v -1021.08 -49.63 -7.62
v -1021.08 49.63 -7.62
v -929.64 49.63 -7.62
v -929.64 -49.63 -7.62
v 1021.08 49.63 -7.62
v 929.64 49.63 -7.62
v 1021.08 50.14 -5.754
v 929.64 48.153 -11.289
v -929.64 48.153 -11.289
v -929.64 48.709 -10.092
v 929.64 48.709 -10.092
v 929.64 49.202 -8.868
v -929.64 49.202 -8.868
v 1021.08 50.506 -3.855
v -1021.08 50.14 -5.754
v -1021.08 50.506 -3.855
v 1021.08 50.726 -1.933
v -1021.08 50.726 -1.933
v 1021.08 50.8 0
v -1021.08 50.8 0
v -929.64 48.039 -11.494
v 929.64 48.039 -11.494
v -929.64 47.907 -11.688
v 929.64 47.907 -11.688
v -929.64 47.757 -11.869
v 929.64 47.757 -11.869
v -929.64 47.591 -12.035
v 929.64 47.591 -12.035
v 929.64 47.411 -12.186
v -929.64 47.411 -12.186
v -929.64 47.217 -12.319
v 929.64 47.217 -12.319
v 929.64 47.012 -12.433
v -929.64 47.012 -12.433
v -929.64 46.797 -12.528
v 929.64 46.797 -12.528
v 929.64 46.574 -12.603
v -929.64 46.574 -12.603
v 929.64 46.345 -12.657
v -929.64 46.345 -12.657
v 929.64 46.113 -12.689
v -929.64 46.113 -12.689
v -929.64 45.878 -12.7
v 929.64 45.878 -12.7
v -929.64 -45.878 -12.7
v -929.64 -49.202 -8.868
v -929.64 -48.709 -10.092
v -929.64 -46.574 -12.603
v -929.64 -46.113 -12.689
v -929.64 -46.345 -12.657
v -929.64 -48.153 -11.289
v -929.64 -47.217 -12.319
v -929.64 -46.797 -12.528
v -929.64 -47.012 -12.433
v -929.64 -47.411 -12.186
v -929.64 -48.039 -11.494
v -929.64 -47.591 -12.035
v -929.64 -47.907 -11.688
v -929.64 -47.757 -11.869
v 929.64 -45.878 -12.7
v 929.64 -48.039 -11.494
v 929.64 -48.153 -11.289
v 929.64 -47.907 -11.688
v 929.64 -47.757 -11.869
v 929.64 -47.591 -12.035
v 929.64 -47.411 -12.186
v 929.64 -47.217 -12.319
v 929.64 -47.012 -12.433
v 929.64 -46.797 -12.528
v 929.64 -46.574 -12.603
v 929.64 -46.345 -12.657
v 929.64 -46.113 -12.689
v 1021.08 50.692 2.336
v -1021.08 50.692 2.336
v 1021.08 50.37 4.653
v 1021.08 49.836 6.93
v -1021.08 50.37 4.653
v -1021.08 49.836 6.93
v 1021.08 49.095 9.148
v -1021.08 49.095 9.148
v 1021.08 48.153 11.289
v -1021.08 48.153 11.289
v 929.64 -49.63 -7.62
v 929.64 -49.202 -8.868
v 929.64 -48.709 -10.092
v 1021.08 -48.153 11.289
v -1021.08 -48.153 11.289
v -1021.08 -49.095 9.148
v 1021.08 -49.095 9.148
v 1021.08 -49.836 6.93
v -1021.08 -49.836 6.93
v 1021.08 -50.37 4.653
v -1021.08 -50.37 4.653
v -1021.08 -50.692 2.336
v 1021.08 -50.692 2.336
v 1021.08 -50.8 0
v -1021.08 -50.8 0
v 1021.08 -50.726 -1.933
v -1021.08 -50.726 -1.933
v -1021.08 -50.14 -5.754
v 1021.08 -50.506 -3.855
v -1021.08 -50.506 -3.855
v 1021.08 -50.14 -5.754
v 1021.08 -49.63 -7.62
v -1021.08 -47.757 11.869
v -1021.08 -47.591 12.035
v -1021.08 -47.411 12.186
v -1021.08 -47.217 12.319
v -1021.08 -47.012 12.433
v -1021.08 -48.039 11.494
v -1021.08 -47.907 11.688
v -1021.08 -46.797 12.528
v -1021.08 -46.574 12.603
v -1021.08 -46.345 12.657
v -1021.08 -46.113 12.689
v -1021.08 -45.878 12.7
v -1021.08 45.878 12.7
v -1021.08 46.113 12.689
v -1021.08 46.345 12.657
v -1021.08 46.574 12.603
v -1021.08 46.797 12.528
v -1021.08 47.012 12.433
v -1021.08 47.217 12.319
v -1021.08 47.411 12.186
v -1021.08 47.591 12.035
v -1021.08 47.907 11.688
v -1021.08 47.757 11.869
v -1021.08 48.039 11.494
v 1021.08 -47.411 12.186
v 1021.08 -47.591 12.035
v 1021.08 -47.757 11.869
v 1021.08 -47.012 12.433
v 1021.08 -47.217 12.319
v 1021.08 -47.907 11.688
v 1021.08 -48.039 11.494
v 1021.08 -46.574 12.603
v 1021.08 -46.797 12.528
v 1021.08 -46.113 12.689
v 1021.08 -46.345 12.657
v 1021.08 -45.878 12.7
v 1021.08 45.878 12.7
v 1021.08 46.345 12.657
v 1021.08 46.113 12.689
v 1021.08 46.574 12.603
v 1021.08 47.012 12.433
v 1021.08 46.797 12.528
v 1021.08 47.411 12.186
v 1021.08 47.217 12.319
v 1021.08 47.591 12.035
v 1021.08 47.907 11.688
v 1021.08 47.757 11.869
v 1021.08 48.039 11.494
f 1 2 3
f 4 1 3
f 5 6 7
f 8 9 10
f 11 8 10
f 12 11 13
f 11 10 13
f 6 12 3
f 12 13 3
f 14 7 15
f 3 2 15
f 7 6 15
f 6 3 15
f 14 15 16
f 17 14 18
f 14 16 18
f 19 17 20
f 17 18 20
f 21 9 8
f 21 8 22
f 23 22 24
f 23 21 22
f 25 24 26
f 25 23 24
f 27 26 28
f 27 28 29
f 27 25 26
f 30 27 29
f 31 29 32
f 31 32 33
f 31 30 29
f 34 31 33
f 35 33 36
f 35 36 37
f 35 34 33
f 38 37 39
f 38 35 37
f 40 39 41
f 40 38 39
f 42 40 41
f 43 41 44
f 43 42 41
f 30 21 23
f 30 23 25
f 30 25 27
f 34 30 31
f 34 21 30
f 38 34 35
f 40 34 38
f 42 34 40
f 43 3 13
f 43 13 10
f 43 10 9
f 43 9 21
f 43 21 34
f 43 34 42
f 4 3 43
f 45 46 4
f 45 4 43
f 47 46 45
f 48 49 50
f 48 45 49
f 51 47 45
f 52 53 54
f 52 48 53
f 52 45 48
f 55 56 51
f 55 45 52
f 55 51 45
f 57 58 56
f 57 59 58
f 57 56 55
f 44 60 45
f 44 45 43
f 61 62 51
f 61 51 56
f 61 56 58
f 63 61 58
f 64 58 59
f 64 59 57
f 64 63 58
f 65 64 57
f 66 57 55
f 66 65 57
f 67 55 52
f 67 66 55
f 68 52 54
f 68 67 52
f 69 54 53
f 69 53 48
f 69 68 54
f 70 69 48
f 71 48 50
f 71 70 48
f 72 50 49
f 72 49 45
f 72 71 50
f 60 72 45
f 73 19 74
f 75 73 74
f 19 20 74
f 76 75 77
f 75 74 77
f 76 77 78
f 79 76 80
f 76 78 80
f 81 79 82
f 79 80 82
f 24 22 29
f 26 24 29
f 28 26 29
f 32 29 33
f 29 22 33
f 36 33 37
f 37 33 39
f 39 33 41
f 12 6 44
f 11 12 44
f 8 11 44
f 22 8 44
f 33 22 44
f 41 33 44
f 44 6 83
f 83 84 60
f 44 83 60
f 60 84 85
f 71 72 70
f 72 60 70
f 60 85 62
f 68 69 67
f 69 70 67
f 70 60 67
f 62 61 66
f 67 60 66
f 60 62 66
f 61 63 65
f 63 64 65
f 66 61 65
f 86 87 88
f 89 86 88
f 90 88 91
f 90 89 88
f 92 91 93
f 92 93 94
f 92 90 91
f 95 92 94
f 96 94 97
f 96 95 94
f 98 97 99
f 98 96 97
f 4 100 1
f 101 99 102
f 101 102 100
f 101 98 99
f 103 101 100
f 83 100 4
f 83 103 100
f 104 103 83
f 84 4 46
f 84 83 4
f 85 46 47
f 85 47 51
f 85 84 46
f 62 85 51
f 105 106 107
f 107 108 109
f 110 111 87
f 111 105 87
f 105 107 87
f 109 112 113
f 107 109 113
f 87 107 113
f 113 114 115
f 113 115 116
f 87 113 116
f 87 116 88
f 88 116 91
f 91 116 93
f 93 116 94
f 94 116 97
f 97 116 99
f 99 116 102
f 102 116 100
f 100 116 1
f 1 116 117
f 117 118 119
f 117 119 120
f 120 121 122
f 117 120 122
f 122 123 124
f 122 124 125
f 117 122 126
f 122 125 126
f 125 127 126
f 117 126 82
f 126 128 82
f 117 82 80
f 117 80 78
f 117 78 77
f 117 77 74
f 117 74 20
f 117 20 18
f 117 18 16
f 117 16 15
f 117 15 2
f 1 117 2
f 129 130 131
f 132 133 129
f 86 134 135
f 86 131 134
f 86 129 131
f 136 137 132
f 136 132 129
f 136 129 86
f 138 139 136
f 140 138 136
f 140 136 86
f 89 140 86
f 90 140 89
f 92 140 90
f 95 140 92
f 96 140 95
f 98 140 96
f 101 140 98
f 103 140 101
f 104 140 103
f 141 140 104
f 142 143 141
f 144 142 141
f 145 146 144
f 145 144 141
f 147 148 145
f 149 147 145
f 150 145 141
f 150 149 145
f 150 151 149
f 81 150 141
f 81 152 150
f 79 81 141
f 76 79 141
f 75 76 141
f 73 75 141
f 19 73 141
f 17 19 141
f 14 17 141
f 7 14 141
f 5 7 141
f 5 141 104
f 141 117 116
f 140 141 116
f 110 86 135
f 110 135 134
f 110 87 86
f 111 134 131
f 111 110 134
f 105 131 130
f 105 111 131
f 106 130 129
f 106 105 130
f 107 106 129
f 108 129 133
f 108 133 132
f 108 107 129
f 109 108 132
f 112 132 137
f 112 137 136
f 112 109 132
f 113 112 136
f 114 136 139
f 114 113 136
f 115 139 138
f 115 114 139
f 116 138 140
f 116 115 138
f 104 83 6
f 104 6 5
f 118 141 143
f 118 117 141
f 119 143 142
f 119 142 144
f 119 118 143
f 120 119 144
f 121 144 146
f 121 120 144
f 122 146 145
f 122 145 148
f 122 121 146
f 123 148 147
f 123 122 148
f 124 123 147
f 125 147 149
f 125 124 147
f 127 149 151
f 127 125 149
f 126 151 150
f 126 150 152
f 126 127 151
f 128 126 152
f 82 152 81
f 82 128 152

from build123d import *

# Parameters (mm, degrees)
BOSS_EXTRUDE2_DEPTH     = 1021.08
FILLET1_R               = 2.54
CUT_EXTRUDE1_DEPTH      = 1023.421780089
CUT_EXTRUDE1_DEPTH_BACK = 1023.421780089
SKETCH2_W               = 91.44
SKETCH2_H               = 5.08


with BuildPart() as part:
    # Sketch1 → Boss-Extrude2 (new, symmetric)
    with BuildSketch(Plane(origin=(0, 0, 0), x_dir=(0, 0, -1), z_dir=(1, 0, 0))):
        with BuildLine():
            ThreePointArc((-12.7, -47.397045256), (-6.574003886, -49.93451595), (-2.91e-07, -50.8))
            ThreePointArc((-2.91e-07, -50.8), (6.574003605, -49.934516025), (12.7, -47.397045256))
            Line((12.7, -47.397045256), (12.7, 47.397045256))
            ThreePointArc((12.7, 47.397045256), (6.574003746, 49.934515988), (0, 50.8))
            ThreePointArc((0, 50.8), (-6.574003746, 49.934515988), (-12.7, 47.397045256))
            Line((-12.7, 47.397045256), (-12.7, -47.397045256))
        make_face()
    extrude(amount=BOSS_EXTRUDE2_DEPTH, both=True)

    # Fillet1
    fillet1_edges = [part.edges().sort_by_distance(p)[0] for p in [
        (-510.54, 47.397045256, 12.7),
        (510.54, 47.397045256, -12.7),
        (-510.54, -47.397045256, -12.7),
        (0, -47.397045256, 12.7),
    ]]
    fillet(fillet1_edges, radius=FILLET1_R)

    # Sketch2 → Cut-Extrude1 (cut, two sides: drawn at the far end of the back side and taken through both)
    with BuildSketch(Plane(origin=(0, 0, 0), x_dir=(1, 0, 0), z_dir=(0, 1, 0)).offset(-CUT_EXTRUDE1_DEPTH_BACK)):
        with Locations((975.36, 10.16)):
            Rectangle(SKETCH2_W, SKETCH2_H)
        with Locations((-975.36, 10.16)):
            Rectangle(SKETCH2_W, SKETCH2_H)
    extrude(amount=CUT_EXTRUDE1_DEPTH + CUT_EXTRUDE1_DEPTH_BACK, mode=Mode.SUBTRACT)


solid = part.part
